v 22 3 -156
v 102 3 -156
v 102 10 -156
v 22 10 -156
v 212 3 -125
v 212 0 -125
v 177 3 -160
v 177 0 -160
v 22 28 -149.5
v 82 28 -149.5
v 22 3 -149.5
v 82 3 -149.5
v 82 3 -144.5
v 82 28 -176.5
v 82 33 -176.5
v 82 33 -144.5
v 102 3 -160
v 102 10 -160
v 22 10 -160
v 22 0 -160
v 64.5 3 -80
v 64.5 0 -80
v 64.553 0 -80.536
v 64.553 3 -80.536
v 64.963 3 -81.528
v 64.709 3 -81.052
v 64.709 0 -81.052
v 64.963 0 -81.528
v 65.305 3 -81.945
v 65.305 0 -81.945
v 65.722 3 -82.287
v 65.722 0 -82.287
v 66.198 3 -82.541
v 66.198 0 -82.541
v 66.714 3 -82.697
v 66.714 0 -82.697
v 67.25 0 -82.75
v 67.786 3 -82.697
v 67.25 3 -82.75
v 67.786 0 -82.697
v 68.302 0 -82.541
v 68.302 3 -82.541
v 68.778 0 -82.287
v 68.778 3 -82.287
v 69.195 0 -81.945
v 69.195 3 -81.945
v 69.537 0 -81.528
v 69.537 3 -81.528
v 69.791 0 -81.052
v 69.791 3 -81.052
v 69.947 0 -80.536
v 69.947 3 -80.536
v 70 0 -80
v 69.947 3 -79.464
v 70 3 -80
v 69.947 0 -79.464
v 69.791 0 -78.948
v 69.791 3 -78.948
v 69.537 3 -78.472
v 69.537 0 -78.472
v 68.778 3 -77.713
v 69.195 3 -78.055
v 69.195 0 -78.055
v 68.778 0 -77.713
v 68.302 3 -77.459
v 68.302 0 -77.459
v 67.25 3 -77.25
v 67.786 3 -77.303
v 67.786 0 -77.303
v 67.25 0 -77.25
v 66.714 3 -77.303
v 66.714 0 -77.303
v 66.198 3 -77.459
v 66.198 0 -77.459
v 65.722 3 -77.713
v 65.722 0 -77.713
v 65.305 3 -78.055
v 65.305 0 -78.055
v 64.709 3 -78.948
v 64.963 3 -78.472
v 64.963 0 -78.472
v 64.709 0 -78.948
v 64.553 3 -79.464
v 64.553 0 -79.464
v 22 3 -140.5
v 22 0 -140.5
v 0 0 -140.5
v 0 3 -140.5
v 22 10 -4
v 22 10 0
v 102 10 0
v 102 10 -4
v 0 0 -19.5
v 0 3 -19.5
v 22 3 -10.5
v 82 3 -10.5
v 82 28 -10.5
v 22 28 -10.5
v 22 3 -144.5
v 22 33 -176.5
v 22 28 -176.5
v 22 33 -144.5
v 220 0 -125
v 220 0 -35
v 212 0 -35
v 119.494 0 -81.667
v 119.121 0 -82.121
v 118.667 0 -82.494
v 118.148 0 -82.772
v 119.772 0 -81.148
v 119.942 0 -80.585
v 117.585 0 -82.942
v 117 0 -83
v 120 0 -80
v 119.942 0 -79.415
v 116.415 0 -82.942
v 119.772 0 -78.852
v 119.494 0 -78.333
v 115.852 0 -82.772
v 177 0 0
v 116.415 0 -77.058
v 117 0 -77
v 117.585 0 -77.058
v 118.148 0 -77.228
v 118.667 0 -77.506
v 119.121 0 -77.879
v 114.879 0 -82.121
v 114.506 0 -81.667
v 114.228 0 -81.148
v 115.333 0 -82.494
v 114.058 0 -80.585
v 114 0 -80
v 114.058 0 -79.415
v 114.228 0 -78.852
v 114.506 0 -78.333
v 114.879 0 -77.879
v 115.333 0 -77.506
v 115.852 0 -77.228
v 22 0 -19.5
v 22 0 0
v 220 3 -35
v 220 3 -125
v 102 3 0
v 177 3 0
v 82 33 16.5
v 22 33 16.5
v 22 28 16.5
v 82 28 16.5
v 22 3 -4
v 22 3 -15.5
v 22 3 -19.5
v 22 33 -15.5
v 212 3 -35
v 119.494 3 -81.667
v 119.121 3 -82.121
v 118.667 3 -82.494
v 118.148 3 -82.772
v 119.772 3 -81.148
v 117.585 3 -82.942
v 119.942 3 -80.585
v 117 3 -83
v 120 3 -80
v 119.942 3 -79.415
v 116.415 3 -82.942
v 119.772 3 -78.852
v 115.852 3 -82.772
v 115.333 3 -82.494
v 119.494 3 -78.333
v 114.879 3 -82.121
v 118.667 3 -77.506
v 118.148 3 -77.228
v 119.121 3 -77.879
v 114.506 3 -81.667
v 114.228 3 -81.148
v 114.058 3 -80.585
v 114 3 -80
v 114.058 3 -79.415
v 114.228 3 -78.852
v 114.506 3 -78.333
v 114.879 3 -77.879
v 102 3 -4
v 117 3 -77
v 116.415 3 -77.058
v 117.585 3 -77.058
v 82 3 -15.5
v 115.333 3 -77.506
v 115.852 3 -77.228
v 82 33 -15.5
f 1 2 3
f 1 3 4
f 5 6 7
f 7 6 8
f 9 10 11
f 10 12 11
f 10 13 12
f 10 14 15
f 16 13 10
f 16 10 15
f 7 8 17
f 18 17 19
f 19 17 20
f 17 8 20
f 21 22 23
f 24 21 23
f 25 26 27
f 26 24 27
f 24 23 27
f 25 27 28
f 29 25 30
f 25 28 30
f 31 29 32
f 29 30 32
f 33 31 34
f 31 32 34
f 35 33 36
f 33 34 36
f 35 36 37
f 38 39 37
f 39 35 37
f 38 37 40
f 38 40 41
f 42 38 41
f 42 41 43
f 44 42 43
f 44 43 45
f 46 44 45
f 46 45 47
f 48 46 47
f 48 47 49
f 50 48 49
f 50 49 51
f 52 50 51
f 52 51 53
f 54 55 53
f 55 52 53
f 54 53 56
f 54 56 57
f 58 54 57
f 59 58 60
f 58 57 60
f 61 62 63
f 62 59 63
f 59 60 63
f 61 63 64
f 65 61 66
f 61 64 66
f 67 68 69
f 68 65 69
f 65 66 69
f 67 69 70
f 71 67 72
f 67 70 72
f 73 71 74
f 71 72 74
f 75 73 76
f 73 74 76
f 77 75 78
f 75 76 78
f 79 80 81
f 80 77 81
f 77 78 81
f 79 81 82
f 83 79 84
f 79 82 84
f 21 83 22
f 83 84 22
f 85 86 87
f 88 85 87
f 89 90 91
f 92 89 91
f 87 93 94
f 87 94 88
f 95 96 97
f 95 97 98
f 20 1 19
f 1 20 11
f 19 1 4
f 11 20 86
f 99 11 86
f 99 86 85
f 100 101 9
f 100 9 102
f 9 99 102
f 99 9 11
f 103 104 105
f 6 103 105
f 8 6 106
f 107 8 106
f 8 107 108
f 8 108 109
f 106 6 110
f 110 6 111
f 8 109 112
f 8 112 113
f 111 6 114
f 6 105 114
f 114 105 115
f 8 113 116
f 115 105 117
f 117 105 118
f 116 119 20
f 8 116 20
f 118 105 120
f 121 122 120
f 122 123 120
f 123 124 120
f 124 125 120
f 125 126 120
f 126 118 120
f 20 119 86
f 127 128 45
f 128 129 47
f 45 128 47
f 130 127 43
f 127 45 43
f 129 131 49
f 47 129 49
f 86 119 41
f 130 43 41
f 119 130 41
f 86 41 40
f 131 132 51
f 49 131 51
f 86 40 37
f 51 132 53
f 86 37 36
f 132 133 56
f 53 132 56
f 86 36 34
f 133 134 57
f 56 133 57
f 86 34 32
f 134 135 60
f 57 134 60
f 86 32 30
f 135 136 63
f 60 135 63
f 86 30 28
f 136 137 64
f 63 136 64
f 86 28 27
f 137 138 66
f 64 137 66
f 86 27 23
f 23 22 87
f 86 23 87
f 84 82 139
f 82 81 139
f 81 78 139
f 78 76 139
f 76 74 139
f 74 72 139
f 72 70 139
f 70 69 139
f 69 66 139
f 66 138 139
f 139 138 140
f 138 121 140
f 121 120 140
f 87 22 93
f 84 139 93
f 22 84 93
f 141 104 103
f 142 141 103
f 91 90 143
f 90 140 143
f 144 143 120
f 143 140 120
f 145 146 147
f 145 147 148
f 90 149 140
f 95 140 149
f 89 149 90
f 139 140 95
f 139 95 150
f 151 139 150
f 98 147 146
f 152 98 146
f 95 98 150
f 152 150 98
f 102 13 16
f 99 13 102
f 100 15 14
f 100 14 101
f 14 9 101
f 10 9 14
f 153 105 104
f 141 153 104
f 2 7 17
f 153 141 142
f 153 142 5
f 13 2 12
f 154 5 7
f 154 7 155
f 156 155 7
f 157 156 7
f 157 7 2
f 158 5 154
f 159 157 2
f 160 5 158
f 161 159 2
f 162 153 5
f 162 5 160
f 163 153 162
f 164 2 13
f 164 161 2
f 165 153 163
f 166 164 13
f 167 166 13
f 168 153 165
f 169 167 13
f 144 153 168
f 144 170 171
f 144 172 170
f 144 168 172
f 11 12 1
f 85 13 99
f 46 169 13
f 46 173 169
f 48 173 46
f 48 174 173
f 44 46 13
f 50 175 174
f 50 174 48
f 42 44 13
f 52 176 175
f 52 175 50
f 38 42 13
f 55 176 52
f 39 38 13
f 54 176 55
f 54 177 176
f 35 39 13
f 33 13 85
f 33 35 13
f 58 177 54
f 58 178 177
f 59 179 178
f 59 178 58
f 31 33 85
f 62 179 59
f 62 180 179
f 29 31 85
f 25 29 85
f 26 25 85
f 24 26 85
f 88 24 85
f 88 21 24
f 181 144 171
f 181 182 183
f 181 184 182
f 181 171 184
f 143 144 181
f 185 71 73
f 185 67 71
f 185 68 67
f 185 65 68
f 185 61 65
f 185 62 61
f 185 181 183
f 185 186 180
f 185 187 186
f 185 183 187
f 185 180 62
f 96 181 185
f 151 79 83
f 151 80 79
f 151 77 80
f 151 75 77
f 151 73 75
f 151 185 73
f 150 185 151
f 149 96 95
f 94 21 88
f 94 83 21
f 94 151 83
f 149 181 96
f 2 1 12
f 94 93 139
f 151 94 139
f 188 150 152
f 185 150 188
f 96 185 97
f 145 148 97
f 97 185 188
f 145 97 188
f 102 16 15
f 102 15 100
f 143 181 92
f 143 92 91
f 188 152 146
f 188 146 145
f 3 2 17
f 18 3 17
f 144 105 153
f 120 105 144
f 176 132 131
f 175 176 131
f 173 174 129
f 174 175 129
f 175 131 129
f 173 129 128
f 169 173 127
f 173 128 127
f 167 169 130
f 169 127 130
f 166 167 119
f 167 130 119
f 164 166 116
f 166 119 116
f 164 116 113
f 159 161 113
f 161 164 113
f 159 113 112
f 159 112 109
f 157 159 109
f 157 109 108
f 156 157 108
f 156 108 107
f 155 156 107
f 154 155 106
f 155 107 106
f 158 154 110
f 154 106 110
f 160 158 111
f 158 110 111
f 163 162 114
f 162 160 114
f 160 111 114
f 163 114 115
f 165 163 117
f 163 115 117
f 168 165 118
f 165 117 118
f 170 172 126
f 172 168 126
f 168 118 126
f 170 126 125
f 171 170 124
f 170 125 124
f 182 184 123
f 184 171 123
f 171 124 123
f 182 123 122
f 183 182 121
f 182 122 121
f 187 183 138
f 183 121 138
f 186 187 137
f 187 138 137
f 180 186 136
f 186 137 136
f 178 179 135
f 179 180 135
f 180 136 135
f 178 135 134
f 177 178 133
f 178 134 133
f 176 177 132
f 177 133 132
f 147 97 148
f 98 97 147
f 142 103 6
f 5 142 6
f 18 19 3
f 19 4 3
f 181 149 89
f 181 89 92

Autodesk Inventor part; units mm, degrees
ref_plane "YZ Plane" through (0, 0, 0) normal (1, 0, 0) x (0, 1, 0)
ref_plane "XZ Plane" through (0, 0, 0) normal (0, 1, 0) x (-1, 0, 0)
ref_plane "XY Plane" through (0, 0, 0) normal (0, 0, 1) x (1, 0, 0)
sketch "Skizze1" plane through (0, 0, 0) normal (0, 1, 0) x (-1, 0, 0)
  circle A0 centre (-117, -80) radius 3
  circle A1 centre (-67.25, -80) radius 2.75
  line L0 (-170, -160) -> (-22, -160)
  line L1 (-220, -125) -> (-212, -125)
  line L2 (-212, -35) -> (-220, -35)
  line L3 (-220, -35) -> (-220, -125)
  line L4 (0, -19.5) -> (-22, -19.5)
  line L5 (-212, -35) -> (-177, 0)
  line L6 (-212, -125) -> (-177, -160)
  line L7 (-22, -140.5) -> (0, -140.5)
  line L8 (-22, 0) -> (-22, -15.5)
  line L9 (-22, -19.5) -> (0, -19.5)
  line L10 (-22, -160) -> (-22, -144.5)
  line L11 (-22, -140.5) -> (0, -140.5)
  line L12 (-22, 0) -> (-102, 0)
  line L13 (-102, 0) -> (-102, -4)
  line L14 (-22, -15.5) -> (-22, 0)
  line L15 (-22, -160) -> (-102, -160)
  line L16 (-102, -160) -> (-102, -156)
  line L17 (-22, -144.5) -> (-22, -160)
  line L18 (-22, -160) -> (-102, -160)
  line L19 (-102, -160) -> (-102, -156)
  line L20 (-102, -156) -> (-22, -156)
  line L21 (-22, -156) -> (-22, -160)
  line L22 (-22, -156) -> (-102, -156)
  line L23 (-22, -149.5) -> (-22, -156)
  line L24 (-22, 0) -> (-102, 0)
  line L25 (-102, 0) -> (-102, -4)
  line L26 (-102, -4) -> (-22, -4)
  line L27 (-22, -4) -> (-22, 0)
  line L28 (-22, -4) -> (-102, -4)
  line L29 (-22, -10.5) -> (-22, -4)
  line L30 (-22, -15.5) -> (-22, -10.5)
  line L31 (-22, -149.5) -> (-82, -149.5)
  line L32 (-22, -144.5) -> (-22, -149.5)
  line L33 (-22, -144.5) -> (-22, -140.5)
  line L34 (-22, 0) -> (-177, 0)
  line L35 (-22, 0) -> (-170, 0)
  line L36 (-22, -15.5) -> (-22, -19.5)
  line L37 (0, -19.5) -> (0, -140.5)
  line L38 (-22, -144.5) -> (-82, -144.5)
  line L39 (-82, -144.5) -> (-82, -149.5)
  line L40 (-82, -149.5) -> (-22, -149.5)
  line L41 (-22, -149.5) -> (-22, -144.5)
  line L42 (-22, -15.5) -> (-82, -15.5)
  line L43 (-82, -15.5) -> (-82, -10.5)
  line L44 (-82, -10.5) -> (-22, -10.5)
  line L45 (-22, -10.5) -> (-22, -15.5)
  line L46 (-82, -15.5) -> (-22, -15.5)
  line L47 (-82, -144.5) -> (-22, -144.5)
  line L48 (-82, -10.5) -> (-22, -10.5)
  line L49 (-220, -35) -> (-220, -125)
  line L50 (-177, -160) -> (-22, -160)
  point P0 (0, 0)
  point P1 (-216, -125)
  point P2 (-216, -35)
  point P3 (-22, -4)
  dimension "d4" = 6
  dimension "d5" = 49.75
  dimension "d7" = 5.5
  dimension "d9" = 8
  dimension "d10" = 90
  dimension "d14" = 60.5
  dimension "d15" = 60.5
  dimension "d17" = 35
  dimension "d25" = 4
  dimension "d27" = 4
  dimension "d31" = 60
  dimension "d32" = 60
extrude "Extrusion1" add sketch "Skizze1" along normal blind 3 contours L50 L6 L1 L3 L2 L5 L34 L13 L26 L8 L44 L43 L42 L36 L4 L37 L7 L33 L38 L39 L31 L10 L20 L16 L0
sketch "Skizze2" plane through (0, 0, 0) normal (0, -1, 0) x (1, 0, 0)
  line L0 (22, -15.5) -> (82, -15.5) projected
  line L1 (82, -15.5) -> (82, -10.5) projected
  line L2 (22, -15.5) -> (82, -15.5)
  line L3 (82, -15.5) -> (82, -10.5)
  line L4 (82, -10.5) -> (22, -10.5)
  line L5 (22, -10.5) -> (22, -15.5)
  line L6 (22, -149.5) -> (82, -149.5) projected
  line L7 (82, -144.5) -> (22, -144.5) projected
  line L8 (22, -149.5) -> (82, -149.5)
  line L9 (82, -149.5) -> (82, -144.5)
  line L10 (82, -144.5) -> (22, -144.5)
  line L11 (22, -144.5) -> (22, -149.5)
  line L12 (102, -156) -> (22, -156) projected
  line L13 (177, -160) -> (102, -160) projected
  line L14 (22, -156) -> (102, -156)
  line L15 (102, -156) -> (102, -160)
  line L16 (102, -160) -> (22, -160)
  line L17 (22, -160) -> (22, -156)
  line L18 (22, -4) -> (102, -4) projected
  line L19 (102, 0) -> (177, 0) projected
  line L20 (22, -4) -> (102, -4)
  line L21 (102, -4) -> (102, 0)
  line L22 (102, 0) -> (22, 0)
  line L23 (22, 0) -> (22, -4)
  point P0 (0, 0)
extrude "Extrusion2" add sketch "Skizze2" against normal blind 10 contours L15 L16 L17 L12 | L23 L22 L21 L18
sketch "Skizze3" plane through (0, 0, 0) normal (0, -1, 0) x (1, 0, 0)
  line L0 (82, -15.5) -> (82, -10.5) projected
  line L1 (22, -15.5) -> (82, -15.5)
  line L2 (82, -15.5) -> (82, -10.5)
  line L3 (82, -10.5) -> (22, -10.5)
  line L4 (22, -10.5) -> (22, -15.5)
  line L5 (82, -144.5) -> (22, -144.5) projected
  line L6 (82, -149.5) -> (82, -144.5) projected
  line L7 (22, -144.5) -> (82, -144.5)
  line L8 (82, -144.5) -> (82, -149.5)
  line L9 (82, -149.5) -> (22, -149.5)
  line L10 (22, -149.5) -> (22, -144.5)
  point P0 (0, 0)
extrude "Extrusion3" add sketch "Skizze3" against normal blind 33
sketch "Skizze4" plane through (22, 3, -10.5) normal (0, 0, 1) x (1, 0, 0)
  line L0 (0, 0) -> (0, 30) projected
  line L1 (60, 0) -> (60, 30) projected
  line L2 (0, 30) -> (60, 30)
  line L3 (60, 30) -> (60, 25)
  line L4 (60, 25) -> (0, 25)
  line L5 (0, 25) -> (0, 30)
  point P0 (-22, -3)
  dimension "d39" = 5
extrude "Extrusion4" add sketch "Skizze4" along normal blind 27
sketch "Skizze5" plane through (82, 3, -149.5) normal (0, 0, -1) x (-1, 0, 0)
  line L0 (0, 0) -> (0, 30) projected
  line L1 (60, 0) -> (60, 30) projected
  line L2 (0, 30) -> (60, 30)
  line L3 (60, 30) -> (60, 25)
  line L4 (60, 25) -> (0, 25)
  line L5 (0, 25) -> (0, 30)
  point P0 (82, -3)
  dimension "d42" = 5
extrude "Extrusion5" add sketch "Skizze5" along normal blind 27
properties part number "boschprofil-platform"
